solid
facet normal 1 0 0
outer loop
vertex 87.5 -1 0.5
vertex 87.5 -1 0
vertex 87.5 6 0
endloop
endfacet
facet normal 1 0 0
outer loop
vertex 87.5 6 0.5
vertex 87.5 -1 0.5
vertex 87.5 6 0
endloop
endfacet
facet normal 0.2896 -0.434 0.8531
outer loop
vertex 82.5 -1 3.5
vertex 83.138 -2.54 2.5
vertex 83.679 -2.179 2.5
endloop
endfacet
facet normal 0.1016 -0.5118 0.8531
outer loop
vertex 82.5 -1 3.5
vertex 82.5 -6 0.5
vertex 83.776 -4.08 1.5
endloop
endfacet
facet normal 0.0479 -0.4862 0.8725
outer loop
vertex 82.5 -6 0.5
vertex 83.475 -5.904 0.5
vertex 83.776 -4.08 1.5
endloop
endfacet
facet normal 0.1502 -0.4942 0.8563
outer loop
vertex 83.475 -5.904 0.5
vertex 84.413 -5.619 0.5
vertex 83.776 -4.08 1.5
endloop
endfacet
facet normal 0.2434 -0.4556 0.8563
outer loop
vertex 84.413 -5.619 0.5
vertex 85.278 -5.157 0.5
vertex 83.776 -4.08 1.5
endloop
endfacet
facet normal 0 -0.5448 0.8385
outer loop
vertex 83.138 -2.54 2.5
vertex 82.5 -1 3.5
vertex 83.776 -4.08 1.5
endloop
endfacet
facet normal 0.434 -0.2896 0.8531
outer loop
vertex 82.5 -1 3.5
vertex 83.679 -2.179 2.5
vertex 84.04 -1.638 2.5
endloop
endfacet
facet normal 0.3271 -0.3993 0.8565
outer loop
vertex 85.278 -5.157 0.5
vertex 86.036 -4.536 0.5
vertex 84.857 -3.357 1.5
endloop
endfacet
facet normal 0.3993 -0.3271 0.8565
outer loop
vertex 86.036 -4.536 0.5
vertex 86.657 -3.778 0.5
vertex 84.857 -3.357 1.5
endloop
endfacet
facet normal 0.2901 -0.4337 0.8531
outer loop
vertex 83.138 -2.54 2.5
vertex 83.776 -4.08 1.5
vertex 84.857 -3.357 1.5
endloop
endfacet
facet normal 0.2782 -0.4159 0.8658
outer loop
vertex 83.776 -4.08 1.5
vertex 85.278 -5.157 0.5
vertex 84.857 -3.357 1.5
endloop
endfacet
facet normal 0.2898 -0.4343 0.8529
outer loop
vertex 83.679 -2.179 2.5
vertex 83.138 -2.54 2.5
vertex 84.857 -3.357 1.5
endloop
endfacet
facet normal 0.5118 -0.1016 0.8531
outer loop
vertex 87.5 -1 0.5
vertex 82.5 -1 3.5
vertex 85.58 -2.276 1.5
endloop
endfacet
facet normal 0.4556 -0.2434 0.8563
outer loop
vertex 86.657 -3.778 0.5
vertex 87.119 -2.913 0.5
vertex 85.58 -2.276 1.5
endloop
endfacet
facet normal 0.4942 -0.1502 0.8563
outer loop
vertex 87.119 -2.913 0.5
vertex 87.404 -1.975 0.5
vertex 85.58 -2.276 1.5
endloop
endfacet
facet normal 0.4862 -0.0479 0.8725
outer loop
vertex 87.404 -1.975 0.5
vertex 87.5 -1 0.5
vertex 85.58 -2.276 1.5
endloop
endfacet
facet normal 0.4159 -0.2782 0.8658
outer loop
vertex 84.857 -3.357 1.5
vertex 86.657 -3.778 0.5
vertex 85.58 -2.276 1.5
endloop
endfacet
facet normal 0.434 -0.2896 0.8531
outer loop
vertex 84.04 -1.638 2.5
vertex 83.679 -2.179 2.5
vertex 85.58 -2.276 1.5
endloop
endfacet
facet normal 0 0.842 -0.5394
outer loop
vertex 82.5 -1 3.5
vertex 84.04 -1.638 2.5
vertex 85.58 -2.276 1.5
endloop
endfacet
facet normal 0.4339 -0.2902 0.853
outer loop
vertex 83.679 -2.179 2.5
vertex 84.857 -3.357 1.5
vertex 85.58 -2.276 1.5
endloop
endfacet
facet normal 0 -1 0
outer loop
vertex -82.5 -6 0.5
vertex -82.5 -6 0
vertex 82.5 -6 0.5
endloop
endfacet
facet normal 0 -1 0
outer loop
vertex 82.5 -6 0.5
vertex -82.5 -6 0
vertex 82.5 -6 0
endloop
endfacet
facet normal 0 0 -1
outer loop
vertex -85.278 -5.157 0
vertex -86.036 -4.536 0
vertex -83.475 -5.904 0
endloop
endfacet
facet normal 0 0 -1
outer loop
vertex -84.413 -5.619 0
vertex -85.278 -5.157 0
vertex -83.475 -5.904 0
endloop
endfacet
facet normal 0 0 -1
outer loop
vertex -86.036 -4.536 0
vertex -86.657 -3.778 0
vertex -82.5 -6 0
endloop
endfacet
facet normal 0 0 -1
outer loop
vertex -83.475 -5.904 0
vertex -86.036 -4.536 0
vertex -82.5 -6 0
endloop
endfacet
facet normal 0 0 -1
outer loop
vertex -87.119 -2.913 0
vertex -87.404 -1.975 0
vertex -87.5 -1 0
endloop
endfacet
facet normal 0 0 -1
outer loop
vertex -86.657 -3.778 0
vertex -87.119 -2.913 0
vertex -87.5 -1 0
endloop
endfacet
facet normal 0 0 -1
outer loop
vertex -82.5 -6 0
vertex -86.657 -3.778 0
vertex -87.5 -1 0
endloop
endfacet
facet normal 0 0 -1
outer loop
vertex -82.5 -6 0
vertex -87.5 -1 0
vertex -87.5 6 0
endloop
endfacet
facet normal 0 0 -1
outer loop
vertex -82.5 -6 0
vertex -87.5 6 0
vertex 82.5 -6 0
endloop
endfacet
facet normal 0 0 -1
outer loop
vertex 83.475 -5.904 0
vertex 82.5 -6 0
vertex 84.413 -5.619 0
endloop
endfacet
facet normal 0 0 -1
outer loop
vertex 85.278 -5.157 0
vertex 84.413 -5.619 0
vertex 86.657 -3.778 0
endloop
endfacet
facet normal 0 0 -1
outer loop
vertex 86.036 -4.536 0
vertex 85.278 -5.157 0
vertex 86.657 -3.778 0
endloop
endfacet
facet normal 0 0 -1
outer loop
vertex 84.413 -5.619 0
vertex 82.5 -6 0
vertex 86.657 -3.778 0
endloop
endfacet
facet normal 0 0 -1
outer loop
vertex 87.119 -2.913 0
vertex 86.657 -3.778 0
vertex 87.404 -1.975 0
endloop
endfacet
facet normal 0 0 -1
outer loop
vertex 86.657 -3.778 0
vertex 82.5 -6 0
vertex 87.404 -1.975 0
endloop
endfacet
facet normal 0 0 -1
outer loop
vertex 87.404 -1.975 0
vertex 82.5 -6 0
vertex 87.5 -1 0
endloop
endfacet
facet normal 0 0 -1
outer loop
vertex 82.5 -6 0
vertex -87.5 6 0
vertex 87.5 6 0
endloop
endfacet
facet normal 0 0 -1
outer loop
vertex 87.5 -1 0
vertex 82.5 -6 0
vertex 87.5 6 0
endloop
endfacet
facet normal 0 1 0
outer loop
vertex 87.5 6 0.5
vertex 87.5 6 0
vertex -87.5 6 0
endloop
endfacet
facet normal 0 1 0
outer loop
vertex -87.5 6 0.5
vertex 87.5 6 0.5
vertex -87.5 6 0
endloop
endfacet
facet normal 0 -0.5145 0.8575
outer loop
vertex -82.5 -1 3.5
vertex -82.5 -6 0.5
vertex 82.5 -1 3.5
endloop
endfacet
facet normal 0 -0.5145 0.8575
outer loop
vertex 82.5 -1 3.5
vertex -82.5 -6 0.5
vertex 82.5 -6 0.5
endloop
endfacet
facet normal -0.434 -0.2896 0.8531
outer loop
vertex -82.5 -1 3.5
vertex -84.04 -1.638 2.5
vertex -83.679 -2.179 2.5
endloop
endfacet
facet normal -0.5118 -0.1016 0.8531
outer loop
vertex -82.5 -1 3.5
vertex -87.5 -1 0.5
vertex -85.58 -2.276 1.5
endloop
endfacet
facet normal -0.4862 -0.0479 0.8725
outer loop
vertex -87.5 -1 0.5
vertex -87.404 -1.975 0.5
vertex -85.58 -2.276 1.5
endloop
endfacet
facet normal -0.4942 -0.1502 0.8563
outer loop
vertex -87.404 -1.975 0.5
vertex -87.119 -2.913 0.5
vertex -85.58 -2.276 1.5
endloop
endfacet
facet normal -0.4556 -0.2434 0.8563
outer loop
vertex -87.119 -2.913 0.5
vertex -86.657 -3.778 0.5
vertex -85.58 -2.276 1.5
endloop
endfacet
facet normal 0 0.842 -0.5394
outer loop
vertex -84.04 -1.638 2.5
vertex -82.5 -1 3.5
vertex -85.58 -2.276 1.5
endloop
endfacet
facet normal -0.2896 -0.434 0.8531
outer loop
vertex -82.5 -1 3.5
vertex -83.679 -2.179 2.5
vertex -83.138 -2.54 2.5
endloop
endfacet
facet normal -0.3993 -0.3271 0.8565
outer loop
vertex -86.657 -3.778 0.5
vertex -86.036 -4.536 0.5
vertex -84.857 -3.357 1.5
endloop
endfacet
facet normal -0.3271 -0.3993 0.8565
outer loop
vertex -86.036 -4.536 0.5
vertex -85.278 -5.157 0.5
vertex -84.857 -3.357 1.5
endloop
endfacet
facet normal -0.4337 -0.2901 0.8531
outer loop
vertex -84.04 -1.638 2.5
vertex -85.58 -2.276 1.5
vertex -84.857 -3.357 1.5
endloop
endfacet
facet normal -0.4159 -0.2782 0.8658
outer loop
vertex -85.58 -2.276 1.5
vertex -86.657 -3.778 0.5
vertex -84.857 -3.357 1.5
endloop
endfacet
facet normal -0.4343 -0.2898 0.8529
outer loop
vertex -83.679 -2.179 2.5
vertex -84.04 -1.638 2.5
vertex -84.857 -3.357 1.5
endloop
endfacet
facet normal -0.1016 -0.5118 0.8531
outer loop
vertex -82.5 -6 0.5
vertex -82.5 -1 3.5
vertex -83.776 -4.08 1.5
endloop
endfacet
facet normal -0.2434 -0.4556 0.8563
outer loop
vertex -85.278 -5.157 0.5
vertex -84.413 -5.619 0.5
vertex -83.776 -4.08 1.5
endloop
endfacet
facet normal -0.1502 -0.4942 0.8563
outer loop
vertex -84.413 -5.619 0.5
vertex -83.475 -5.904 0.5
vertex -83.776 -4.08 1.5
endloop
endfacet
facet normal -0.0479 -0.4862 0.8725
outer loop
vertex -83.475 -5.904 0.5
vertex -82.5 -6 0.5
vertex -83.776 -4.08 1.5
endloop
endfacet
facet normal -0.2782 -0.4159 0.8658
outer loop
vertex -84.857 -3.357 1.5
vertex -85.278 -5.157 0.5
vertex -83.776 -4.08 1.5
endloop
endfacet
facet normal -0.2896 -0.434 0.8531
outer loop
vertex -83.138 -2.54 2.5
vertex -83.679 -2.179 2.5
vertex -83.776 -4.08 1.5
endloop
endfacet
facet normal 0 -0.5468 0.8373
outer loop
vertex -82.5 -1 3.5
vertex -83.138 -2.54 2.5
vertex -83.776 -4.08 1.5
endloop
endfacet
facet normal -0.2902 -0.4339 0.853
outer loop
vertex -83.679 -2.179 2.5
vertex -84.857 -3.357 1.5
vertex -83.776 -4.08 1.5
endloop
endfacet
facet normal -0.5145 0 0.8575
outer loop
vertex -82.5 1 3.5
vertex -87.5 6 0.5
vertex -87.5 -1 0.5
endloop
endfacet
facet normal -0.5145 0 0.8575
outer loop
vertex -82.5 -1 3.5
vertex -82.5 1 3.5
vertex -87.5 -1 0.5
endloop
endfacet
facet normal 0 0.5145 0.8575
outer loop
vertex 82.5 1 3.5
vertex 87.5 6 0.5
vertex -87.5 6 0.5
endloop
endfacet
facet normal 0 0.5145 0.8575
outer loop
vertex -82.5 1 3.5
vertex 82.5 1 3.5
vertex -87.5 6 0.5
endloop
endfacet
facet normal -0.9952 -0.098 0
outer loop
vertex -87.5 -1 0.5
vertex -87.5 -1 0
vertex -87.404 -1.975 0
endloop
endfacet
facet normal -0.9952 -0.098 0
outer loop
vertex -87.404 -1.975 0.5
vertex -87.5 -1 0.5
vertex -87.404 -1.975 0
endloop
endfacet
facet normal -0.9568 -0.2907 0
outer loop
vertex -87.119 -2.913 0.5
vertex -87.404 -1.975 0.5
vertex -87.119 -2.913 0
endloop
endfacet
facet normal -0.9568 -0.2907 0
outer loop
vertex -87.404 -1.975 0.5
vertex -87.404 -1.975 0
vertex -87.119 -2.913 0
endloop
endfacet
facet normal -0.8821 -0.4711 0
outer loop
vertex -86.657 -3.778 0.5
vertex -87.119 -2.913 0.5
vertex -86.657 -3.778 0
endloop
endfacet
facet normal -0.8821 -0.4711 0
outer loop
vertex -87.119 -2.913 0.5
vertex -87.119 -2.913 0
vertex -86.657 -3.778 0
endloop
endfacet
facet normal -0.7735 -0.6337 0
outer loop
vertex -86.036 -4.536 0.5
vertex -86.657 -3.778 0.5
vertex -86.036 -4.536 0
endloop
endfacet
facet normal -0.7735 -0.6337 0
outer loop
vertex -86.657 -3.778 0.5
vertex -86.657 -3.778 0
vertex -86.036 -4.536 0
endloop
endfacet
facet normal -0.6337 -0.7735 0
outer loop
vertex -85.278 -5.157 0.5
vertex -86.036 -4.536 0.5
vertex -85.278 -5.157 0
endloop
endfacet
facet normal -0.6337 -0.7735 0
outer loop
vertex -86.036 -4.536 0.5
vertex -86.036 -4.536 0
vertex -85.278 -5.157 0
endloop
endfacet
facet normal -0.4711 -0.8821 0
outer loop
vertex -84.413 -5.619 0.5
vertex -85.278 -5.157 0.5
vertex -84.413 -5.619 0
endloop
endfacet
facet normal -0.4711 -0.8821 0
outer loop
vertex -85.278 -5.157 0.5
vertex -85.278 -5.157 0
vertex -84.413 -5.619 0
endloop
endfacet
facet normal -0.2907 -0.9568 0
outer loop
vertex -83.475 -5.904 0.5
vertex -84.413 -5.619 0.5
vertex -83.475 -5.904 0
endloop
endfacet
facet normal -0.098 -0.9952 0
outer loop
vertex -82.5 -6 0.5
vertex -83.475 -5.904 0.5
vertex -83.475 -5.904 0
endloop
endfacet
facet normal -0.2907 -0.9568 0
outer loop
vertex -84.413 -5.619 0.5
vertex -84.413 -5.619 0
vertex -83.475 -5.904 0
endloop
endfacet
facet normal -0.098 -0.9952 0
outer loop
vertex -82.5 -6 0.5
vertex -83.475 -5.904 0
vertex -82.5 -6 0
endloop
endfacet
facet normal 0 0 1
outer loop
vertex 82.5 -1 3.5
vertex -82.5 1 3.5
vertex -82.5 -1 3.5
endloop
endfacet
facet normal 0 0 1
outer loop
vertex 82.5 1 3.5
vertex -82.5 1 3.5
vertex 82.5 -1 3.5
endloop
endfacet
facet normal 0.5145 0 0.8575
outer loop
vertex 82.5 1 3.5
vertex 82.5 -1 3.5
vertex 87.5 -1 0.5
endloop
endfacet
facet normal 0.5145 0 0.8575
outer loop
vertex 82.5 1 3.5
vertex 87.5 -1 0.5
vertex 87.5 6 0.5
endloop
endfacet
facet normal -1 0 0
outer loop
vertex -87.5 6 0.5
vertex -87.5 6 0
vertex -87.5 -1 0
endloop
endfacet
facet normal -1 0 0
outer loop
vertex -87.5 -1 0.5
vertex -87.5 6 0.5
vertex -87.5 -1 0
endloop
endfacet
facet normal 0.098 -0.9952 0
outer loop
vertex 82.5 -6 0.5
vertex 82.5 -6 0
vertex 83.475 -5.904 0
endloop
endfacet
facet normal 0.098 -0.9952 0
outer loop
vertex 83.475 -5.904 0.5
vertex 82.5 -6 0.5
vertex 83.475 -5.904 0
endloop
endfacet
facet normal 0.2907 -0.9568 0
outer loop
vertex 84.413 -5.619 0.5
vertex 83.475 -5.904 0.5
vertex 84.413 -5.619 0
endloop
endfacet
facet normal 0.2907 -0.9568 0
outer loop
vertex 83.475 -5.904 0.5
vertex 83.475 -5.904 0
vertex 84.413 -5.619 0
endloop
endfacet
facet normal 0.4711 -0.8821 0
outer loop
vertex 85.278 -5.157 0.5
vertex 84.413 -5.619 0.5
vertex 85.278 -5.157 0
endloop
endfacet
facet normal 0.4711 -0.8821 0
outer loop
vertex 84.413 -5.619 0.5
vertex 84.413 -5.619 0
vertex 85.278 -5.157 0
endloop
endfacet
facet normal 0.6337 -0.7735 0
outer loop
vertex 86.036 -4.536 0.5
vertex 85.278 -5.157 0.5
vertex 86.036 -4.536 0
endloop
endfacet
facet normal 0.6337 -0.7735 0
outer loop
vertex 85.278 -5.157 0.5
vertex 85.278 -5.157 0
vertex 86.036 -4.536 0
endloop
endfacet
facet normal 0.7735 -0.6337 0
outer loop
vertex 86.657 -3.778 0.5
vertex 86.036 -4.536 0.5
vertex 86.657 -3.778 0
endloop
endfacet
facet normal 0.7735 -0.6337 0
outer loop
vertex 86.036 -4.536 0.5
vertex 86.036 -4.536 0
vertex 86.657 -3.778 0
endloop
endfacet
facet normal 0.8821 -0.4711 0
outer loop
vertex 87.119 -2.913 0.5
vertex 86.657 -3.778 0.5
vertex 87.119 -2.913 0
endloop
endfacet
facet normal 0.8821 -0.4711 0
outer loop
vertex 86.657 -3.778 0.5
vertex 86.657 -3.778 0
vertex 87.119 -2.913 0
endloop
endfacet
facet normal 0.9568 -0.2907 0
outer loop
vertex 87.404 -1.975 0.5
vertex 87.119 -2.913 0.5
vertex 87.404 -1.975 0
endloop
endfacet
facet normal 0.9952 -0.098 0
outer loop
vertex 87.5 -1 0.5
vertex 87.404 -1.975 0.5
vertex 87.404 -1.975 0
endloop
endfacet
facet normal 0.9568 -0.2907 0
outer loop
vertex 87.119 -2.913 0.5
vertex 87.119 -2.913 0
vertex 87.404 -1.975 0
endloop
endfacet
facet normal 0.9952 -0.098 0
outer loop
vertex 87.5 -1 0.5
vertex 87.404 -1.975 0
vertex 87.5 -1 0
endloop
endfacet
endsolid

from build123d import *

# Parameters (mm, degrees)
F1_DEPTH = 3.5
F2_SIZE2 = 2.99999
F2_SIZE  = 4.99999


# Not quite as in the source:
# - a fillet or chamfer is up to 0.001 mm smaller than in the source, because OpenCascade refuses the exact size


with BuildPart() as f1:
    # F0 (on Top) → F1 (new body)
    with BuildSketch(Plane.XY):
        with BuildLine():
            Line((-82.5, -6), (82.5, -6))
            ThreePointArc((82.5, -6), (86.0355339059, -4.5355339059), (87.5, -1))
            Line((87.5, -1), (87.5, 6))
            Line((87.5, 6), (-87.5, 6))
            Line((-87.5, 6), (-87.5, -1))
            ThreePointArc((-87.5, -1), (-86.0355339059, -4.5355339059), (-82.5, -6))
        make_face()
    extrude(amount=F1_DEPTH)

    # F2 (size 5 and 3 in the source; OpenCascade refuses exactly that, so slightly less here)
    f2_edges = [f1.edges().sort_by_distance(p)[0] for p in [
        (0, 6, 3.5),
        (87.5, 2.5, 3.5),
    ]]
    f2_side = f1.faces().sort_by_distance((0, 0.025079, 3.5))[0]
    chamfer(f2_edges, length=F2_SIZE, length2=F2_SIZE2, reference=f2_side)


solid = f1.part
